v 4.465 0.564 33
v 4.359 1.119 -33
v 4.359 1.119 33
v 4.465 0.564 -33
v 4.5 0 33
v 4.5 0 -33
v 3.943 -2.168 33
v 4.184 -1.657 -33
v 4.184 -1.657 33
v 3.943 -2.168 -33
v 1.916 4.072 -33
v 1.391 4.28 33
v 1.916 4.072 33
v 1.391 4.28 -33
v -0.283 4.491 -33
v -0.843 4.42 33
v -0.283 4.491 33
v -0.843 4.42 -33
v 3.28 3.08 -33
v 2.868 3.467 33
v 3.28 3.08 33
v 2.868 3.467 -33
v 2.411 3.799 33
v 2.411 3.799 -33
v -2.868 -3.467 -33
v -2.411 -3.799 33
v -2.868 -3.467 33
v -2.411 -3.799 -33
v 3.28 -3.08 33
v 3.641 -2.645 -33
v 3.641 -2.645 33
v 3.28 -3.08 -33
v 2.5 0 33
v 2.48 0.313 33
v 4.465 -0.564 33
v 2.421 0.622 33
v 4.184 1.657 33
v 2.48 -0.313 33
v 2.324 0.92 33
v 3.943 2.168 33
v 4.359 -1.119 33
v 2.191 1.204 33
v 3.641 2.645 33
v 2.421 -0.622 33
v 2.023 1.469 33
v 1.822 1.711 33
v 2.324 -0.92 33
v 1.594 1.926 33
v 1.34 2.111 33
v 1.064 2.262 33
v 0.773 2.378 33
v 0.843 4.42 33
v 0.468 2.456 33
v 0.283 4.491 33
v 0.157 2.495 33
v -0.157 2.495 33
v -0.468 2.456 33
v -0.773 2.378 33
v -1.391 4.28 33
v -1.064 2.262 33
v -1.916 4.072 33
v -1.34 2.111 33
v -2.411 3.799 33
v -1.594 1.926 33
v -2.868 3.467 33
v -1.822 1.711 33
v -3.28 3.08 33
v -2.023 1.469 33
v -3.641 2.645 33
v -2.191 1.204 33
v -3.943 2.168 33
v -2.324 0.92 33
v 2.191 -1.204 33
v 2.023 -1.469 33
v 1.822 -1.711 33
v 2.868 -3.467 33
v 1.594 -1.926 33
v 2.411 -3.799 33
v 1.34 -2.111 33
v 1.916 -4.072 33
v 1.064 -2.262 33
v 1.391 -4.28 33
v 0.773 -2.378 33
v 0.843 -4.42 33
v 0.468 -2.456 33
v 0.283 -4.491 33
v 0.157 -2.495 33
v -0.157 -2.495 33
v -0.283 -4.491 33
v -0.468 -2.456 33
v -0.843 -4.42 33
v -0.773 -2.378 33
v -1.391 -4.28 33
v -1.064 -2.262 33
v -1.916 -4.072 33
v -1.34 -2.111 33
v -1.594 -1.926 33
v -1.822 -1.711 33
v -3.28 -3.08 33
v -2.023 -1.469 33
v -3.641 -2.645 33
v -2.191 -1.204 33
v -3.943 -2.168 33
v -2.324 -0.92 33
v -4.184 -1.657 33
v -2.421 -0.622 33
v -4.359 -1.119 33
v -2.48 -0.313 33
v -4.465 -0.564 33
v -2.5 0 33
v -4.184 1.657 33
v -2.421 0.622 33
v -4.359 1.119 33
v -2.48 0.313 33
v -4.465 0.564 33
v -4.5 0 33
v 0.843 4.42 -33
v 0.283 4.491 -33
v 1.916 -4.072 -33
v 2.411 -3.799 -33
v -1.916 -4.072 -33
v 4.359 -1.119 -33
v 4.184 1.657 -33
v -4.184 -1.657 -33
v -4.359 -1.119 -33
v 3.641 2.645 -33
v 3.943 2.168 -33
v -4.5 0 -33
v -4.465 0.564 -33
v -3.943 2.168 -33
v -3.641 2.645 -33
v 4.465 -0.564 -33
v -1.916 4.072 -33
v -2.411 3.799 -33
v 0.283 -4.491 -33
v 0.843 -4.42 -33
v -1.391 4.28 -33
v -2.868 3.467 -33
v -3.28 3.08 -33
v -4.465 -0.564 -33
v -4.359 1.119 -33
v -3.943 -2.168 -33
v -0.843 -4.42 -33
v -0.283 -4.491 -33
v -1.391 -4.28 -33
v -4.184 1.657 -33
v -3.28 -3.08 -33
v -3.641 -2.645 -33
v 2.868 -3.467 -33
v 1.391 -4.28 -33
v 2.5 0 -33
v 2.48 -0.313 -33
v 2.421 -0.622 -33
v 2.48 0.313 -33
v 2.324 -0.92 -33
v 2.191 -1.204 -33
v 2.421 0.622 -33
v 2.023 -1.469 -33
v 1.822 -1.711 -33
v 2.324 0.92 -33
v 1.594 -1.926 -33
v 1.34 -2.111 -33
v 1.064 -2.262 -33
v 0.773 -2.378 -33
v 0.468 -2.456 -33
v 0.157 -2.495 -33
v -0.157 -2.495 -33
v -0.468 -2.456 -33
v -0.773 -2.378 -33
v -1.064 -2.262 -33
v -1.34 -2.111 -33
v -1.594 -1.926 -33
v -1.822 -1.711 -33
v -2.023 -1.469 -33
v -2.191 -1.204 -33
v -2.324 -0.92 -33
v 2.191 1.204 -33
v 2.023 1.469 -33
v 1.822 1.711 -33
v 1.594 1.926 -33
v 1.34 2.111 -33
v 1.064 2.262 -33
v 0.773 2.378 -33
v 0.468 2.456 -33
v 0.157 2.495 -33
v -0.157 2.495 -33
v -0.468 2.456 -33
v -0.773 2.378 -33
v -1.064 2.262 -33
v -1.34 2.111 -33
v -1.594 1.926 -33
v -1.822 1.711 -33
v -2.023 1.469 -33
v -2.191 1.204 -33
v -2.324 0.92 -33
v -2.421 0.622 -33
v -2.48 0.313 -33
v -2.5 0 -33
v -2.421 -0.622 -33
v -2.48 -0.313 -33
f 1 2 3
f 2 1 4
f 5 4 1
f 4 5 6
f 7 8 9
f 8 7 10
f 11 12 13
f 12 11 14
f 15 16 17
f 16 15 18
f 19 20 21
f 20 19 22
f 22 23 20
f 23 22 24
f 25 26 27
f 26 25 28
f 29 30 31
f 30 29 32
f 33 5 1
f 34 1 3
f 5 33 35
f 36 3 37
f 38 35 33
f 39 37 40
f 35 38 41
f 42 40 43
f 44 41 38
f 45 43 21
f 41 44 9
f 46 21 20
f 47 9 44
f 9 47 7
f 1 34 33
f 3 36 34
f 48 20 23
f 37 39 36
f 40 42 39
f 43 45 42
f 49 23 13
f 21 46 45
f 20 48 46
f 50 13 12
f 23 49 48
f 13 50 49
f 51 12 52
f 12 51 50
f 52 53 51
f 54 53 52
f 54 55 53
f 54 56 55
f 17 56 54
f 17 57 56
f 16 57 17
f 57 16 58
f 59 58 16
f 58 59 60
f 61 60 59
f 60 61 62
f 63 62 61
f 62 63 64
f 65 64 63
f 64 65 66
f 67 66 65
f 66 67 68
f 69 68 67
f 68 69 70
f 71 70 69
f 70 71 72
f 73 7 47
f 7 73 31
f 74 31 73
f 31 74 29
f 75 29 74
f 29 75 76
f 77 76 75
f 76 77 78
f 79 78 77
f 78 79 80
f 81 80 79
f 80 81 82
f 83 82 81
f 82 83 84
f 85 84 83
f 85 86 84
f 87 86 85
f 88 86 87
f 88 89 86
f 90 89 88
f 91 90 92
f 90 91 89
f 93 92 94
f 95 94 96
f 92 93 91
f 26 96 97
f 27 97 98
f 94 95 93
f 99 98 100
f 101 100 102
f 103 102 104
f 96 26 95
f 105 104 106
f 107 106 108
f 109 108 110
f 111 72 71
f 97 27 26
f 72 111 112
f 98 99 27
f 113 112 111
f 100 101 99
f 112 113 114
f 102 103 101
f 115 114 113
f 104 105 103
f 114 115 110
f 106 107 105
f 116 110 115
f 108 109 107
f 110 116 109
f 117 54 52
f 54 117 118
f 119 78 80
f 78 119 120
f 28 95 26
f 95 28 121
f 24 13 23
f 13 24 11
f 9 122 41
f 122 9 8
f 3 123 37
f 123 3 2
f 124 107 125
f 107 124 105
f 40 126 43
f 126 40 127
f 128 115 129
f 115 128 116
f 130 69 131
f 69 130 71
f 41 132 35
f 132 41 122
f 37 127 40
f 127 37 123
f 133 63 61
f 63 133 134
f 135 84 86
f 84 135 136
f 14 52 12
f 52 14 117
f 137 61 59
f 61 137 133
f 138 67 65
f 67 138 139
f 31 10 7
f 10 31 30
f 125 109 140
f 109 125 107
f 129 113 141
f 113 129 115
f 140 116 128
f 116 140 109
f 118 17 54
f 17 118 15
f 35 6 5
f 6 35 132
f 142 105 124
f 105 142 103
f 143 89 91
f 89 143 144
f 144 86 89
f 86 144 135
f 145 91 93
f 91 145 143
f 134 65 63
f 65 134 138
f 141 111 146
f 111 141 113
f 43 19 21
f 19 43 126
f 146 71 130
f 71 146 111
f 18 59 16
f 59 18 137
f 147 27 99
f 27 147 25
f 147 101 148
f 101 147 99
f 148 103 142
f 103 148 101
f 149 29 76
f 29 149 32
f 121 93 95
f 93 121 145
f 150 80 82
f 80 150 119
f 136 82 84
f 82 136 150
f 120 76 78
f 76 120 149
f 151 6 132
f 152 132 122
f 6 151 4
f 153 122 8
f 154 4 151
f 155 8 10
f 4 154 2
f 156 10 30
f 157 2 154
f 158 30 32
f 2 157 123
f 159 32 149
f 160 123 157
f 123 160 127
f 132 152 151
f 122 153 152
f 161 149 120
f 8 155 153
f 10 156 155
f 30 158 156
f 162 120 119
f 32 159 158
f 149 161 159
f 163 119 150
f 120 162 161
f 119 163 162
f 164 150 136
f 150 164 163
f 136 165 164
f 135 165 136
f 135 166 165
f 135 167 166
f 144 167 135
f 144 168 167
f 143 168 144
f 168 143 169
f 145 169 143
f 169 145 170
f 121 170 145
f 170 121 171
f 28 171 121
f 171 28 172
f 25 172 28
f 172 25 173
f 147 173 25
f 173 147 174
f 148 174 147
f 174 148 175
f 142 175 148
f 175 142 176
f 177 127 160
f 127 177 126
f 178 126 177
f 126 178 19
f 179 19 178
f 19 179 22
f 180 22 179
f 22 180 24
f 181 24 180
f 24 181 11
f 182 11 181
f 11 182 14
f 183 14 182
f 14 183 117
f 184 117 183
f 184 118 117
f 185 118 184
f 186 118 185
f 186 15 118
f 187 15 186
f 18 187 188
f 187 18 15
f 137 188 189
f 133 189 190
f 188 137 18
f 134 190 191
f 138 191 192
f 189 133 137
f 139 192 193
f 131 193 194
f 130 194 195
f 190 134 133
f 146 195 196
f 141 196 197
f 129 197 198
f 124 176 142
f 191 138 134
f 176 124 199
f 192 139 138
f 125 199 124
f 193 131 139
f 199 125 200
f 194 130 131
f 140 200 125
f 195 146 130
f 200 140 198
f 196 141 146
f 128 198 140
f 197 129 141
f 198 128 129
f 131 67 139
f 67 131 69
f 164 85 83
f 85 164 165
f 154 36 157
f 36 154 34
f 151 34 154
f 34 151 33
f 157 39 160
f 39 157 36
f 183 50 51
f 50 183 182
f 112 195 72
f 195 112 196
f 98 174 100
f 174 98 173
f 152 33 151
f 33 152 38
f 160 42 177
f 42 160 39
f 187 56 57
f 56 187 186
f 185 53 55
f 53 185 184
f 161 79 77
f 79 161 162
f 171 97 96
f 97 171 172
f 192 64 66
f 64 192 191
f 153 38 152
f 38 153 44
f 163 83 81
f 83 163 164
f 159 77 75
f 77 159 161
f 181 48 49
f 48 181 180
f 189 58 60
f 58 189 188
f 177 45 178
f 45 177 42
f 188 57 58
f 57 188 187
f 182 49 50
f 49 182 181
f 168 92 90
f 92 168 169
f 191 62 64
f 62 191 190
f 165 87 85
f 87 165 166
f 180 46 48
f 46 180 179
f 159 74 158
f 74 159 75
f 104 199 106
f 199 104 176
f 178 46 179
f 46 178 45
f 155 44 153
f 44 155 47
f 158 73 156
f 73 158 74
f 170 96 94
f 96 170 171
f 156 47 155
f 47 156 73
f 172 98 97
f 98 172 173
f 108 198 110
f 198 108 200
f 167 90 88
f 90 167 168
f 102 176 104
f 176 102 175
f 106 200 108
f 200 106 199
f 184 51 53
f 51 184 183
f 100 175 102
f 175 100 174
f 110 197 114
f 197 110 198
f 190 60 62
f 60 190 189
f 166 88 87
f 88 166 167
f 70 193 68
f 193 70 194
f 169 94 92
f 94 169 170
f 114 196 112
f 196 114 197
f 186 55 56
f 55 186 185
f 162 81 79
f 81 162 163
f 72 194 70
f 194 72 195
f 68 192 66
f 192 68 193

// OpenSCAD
$fn = 50;


difference() {
	union() {
		translate(v = [0, 0, -33.0000000000]) {
			cylinder(h = 66, r = 4.5000000000);
		}
	}
	union() {
		translate(v = [0, 0, -100.0000000000]) {
			cylinder(h = 200, r = 2.5000000000);
		}
	}
}
